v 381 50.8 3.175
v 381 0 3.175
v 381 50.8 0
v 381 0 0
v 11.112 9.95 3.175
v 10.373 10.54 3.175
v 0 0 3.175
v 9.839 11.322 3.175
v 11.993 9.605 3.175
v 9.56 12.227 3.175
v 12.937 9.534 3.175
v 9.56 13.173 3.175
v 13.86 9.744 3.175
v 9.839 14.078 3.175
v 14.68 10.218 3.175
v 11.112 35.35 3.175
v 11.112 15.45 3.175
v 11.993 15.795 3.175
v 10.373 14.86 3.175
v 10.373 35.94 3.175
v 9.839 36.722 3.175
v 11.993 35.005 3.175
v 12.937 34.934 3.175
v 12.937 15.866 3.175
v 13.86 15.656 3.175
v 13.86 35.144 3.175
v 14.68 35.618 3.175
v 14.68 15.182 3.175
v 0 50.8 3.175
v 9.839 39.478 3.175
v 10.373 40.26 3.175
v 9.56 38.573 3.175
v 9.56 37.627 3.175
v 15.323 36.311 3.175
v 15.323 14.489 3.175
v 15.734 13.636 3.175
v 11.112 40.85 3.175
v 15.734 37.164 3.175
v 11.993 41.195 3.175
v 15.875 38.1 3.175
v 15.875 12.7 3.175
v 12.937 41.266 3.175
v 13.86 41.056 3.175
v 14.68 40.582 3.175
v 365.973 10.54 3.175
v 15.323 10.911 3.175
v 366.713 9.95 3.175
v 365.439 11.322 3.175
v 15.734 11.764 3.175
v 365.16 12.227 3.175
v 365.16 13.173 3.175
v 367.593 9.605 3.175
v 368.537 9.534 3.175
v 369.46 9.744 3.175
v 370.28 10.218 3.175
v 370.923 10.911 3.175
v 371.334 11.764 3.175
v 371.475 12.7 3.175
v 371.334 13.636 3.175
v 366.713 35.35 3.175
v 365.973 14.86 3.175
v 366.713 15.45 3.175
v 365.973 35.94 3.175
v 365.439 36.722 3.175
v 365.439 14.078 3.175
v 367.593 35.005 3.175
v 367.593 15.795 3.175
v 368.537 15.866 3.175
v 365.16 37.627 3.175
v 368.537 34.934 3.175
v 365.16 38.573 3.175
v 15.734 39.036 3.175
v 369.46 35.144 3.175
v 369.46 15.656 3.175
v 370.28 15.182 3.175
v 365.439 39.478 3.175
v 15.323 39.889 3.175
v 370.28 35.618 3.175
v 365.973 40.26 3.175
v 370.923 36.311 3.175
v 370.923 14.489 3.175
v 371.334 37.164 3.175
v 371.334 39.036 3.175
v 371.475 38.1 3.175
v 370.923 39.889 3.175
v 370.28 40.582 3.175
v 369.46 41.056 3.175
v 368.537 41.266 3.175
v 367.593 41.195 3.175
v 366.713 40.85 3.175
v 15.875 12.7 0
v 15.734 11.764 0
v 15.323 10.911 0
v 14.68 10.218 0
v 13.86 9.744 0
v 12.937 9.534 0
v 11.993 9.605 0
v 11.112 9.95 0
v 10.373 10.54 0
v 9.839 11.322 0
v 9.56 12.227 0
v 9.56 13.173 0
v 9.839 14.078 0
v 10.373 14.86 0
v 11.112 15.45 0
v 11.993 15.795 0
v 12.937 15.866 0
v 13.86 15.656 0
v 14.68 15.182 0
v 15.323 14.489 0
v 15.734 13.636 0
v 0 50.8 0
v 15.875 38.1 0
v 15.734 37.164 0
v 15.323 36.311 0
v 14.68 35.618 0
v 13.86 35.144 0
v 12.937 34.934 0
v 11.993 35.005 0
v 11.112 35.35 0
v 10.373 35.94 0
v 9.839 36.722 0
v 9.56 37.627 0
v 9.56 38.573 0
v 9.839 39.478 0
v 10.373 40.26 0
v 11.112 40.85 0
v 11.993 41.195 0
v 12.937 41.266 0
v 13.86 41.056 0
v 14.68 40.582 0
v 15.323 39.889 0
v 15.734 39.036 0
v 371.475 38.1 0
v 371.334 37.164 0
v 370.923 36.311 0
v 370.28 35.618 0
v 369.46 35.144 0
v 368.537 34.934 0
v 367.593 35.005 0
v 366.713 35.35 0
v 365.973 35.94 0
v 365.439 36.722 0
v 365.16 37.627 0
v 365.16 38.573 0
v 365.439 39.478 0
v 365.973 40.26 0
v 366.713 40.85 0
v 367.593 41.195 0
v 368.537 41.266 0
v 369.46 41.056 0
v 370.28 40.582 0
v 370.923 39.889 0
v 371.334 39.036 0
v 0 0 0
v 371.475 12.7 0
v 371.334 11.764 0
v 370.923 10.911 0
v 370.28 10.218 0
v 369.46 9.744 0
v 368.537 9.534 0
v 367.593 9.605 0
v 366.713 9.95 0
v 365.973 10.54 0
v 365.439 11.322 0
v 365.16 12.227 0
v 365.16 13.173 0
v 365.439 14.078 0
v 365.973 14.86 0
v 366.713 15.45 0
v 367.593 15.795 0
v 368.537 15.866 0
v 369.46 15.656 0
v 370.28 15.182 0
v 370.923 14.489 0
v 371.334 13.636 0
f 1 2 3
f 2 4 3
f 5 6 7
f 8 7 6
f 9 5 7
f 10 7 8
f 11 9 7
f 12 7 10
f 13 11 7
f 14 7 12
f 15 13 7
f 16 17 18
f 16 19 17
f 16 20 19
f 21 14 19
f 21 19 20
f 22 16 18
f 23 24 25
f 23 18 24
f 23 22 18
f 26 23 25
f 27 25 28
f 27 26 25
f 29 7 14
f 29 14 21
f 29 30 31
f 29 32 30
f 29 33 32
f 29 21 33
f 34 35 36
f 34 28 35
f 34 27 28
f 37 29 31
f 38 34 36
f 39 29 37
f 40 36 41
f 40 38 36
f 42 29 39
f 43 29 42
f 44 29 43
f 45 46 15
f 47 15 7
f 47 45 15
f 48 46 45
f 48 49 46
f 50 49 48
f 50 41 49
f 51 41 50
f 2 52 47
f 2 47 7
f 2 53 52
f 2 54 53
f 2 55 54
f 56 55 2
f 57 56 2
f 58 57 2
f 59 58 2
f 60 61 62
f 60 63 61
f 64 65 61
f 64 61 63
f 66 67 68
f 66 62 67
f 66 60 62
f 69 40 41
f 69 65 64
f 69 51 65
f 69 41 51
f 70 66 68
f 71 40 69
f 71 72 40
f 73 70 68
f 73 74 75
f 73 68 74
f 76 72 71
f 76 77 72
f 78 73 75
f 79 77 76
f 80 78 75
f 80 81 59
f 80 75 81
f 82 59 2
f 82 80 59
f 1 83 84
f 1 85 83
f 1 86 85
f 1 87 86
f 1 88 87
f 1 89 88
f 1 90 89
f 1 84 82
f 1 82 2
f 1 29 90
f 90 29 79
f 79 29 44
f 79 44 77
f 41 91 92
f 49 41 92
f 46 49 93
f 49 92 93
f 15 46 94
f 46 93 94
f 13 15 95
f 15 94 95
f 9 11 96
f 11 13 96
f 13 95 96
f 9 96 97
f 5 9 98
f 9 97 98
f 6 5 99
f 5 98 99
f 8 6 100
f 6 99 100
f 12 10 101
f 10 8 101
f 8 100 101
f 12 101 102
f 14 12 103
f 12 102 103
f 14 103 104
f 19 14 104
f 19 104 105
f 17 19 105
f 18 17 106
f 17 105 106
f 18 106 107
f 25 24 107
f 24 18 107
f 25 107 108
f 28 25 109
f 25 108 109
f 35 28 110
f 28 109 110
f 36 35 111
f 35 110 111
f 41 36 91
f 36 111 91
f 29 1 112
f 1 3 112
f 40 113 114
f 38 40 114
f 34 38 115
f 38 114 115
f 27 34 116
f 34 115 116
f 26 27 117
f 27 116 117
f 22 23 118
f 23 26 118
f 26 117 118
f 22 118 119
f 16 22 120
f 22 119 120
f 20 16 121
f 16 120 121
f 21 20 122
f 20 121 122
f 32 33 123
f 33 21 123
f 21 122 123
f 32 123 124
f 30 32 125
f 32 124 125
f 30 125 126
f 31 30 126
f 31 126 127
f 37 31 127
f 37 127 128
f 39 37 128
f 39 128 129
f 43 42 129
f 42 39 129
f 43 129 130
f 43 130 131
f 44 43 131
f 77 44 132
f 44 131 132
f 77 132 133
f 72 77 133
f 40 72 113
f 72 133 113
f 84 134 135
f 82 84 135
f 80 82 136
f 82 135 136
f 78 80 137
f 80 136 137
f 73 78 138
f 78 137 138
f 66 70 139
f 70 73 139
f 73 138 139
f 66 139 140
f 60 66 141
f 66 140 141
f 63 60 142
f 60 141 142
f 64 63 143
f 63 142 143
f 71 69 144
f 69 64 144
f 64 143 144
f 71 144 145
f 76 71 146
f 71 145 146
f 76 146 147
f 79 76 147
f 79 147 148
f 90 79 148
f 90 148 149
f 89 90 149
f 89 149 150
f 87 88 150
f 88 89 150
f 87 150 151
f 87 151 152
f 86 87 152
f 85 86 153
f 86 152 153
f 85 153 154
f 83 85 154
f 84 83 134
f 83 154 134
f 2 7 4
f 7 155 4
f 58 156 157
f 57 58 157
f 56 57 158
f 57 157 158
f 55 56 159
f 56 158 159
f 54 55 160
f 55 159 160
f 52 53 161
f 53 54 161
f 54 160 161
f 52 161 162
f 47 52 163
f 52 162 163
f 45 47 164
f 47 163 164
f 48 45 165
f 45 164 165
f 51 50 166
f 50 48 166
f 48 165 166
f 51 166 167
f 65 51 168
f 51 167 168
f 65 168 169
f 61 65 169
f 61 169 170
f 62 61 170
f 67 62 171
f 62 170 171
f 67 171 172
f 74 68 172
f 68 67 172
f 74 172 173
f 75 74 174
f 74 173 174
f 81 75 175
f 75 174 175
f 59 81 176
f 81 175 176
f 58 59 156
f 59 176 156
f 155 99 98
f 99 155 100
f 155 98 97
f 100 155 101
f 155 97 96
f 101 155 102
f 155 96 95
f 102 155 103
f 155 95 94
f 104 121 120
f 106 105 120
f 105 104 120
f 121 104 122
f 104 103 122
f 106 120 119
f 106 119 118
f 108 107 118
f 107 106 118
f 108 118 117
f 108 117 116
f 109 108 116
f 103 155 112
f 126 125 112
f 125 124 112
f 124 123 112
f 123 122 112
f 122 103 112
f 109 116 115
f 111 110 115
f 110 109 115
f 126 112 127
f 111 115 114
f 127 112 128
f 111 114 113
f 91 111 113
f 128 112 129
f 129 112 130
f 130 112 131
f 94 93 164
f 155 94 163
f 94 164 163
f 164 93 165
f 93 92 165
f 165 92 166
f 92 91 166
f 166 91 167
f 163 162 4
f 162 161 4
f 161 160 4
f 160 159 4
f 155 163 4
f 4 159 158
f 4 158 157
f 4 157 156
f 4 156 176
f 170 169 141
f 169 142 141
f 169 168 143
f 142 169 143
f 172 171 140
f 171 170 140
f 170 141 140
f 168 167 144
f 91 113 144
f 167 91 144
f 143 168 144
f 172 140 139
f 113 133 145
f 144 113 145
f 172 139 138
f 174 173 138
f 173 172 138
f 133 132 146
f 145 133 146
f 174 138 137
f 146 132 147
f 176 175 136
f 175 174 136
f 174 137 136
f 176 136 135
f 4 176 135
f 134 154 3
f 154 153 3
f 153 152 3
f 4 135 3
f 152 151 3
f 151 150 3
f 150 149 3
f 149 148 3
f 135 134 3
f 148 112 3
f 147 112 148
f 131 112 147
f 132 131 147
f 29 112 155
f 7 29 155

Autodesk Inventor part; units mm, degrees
ref_plane "YZ Plane" through (0, 0, 0) normal (1, 0, 0) x (0, 1, 0)
ref_plane "XZ Plane" through (0, 0, 0) normal (0, 1, 0) x (-1, 0, 0)
ref_plane "XY Plane" through (0, 0, 0) normal (0, 0, 1) x (1, 0, 0)
sketch "Sketch1" plane through (0, 0, 0) normal (0, 0, 1) x (1, 0, 0)
  line L0 (0, 0) -> (381, 0)
  line L1 (381, 0) -> (381, 50.8)
  line L2 (381, 50.8) -> (0, 50.8)
  line L3 (0, 50.8) -> (0, 0)
  line L4 (12.7, 50.8) -> (12.7, 0) construction
  line L5 (0, 38.1) -> (12.7, 38.1) construction
  line L6 (0, 12.7) -> (12.7, 12.7) construction
  circle A0 centre (12.7, 38.1) radius 3.175
  circle A1 centre (12.7, 12.7) radius 3.175
  line L7 (190.5, 50.8) -> (190.5, 0) construction
  line L8 (368.3, 50.8) -> (368.3, 0) construction
  line L9 (381, 38.1) -> (368.3, 38.1) construction
  line L10 (381, 12.7) -> (368.3, 12.7) construction
  circle A2 centre (368.3, 38.1) radius 3.175
  circle A3 centre (368.3, 12.7) radius 3.175
  dimension "d0" = 381
  dimension "d1" = 50.8
  dimension "d2" = 12.7
  dimension "d3" = 12.7
  dimension "d4" = 25.4
  dimension "d5" = 6.35
  dimension "d6" = 6.35
extrude "Extrusion1" add sketch "Sketch1" along normal blind 3.175
properties part number "slider-crossbeam"
